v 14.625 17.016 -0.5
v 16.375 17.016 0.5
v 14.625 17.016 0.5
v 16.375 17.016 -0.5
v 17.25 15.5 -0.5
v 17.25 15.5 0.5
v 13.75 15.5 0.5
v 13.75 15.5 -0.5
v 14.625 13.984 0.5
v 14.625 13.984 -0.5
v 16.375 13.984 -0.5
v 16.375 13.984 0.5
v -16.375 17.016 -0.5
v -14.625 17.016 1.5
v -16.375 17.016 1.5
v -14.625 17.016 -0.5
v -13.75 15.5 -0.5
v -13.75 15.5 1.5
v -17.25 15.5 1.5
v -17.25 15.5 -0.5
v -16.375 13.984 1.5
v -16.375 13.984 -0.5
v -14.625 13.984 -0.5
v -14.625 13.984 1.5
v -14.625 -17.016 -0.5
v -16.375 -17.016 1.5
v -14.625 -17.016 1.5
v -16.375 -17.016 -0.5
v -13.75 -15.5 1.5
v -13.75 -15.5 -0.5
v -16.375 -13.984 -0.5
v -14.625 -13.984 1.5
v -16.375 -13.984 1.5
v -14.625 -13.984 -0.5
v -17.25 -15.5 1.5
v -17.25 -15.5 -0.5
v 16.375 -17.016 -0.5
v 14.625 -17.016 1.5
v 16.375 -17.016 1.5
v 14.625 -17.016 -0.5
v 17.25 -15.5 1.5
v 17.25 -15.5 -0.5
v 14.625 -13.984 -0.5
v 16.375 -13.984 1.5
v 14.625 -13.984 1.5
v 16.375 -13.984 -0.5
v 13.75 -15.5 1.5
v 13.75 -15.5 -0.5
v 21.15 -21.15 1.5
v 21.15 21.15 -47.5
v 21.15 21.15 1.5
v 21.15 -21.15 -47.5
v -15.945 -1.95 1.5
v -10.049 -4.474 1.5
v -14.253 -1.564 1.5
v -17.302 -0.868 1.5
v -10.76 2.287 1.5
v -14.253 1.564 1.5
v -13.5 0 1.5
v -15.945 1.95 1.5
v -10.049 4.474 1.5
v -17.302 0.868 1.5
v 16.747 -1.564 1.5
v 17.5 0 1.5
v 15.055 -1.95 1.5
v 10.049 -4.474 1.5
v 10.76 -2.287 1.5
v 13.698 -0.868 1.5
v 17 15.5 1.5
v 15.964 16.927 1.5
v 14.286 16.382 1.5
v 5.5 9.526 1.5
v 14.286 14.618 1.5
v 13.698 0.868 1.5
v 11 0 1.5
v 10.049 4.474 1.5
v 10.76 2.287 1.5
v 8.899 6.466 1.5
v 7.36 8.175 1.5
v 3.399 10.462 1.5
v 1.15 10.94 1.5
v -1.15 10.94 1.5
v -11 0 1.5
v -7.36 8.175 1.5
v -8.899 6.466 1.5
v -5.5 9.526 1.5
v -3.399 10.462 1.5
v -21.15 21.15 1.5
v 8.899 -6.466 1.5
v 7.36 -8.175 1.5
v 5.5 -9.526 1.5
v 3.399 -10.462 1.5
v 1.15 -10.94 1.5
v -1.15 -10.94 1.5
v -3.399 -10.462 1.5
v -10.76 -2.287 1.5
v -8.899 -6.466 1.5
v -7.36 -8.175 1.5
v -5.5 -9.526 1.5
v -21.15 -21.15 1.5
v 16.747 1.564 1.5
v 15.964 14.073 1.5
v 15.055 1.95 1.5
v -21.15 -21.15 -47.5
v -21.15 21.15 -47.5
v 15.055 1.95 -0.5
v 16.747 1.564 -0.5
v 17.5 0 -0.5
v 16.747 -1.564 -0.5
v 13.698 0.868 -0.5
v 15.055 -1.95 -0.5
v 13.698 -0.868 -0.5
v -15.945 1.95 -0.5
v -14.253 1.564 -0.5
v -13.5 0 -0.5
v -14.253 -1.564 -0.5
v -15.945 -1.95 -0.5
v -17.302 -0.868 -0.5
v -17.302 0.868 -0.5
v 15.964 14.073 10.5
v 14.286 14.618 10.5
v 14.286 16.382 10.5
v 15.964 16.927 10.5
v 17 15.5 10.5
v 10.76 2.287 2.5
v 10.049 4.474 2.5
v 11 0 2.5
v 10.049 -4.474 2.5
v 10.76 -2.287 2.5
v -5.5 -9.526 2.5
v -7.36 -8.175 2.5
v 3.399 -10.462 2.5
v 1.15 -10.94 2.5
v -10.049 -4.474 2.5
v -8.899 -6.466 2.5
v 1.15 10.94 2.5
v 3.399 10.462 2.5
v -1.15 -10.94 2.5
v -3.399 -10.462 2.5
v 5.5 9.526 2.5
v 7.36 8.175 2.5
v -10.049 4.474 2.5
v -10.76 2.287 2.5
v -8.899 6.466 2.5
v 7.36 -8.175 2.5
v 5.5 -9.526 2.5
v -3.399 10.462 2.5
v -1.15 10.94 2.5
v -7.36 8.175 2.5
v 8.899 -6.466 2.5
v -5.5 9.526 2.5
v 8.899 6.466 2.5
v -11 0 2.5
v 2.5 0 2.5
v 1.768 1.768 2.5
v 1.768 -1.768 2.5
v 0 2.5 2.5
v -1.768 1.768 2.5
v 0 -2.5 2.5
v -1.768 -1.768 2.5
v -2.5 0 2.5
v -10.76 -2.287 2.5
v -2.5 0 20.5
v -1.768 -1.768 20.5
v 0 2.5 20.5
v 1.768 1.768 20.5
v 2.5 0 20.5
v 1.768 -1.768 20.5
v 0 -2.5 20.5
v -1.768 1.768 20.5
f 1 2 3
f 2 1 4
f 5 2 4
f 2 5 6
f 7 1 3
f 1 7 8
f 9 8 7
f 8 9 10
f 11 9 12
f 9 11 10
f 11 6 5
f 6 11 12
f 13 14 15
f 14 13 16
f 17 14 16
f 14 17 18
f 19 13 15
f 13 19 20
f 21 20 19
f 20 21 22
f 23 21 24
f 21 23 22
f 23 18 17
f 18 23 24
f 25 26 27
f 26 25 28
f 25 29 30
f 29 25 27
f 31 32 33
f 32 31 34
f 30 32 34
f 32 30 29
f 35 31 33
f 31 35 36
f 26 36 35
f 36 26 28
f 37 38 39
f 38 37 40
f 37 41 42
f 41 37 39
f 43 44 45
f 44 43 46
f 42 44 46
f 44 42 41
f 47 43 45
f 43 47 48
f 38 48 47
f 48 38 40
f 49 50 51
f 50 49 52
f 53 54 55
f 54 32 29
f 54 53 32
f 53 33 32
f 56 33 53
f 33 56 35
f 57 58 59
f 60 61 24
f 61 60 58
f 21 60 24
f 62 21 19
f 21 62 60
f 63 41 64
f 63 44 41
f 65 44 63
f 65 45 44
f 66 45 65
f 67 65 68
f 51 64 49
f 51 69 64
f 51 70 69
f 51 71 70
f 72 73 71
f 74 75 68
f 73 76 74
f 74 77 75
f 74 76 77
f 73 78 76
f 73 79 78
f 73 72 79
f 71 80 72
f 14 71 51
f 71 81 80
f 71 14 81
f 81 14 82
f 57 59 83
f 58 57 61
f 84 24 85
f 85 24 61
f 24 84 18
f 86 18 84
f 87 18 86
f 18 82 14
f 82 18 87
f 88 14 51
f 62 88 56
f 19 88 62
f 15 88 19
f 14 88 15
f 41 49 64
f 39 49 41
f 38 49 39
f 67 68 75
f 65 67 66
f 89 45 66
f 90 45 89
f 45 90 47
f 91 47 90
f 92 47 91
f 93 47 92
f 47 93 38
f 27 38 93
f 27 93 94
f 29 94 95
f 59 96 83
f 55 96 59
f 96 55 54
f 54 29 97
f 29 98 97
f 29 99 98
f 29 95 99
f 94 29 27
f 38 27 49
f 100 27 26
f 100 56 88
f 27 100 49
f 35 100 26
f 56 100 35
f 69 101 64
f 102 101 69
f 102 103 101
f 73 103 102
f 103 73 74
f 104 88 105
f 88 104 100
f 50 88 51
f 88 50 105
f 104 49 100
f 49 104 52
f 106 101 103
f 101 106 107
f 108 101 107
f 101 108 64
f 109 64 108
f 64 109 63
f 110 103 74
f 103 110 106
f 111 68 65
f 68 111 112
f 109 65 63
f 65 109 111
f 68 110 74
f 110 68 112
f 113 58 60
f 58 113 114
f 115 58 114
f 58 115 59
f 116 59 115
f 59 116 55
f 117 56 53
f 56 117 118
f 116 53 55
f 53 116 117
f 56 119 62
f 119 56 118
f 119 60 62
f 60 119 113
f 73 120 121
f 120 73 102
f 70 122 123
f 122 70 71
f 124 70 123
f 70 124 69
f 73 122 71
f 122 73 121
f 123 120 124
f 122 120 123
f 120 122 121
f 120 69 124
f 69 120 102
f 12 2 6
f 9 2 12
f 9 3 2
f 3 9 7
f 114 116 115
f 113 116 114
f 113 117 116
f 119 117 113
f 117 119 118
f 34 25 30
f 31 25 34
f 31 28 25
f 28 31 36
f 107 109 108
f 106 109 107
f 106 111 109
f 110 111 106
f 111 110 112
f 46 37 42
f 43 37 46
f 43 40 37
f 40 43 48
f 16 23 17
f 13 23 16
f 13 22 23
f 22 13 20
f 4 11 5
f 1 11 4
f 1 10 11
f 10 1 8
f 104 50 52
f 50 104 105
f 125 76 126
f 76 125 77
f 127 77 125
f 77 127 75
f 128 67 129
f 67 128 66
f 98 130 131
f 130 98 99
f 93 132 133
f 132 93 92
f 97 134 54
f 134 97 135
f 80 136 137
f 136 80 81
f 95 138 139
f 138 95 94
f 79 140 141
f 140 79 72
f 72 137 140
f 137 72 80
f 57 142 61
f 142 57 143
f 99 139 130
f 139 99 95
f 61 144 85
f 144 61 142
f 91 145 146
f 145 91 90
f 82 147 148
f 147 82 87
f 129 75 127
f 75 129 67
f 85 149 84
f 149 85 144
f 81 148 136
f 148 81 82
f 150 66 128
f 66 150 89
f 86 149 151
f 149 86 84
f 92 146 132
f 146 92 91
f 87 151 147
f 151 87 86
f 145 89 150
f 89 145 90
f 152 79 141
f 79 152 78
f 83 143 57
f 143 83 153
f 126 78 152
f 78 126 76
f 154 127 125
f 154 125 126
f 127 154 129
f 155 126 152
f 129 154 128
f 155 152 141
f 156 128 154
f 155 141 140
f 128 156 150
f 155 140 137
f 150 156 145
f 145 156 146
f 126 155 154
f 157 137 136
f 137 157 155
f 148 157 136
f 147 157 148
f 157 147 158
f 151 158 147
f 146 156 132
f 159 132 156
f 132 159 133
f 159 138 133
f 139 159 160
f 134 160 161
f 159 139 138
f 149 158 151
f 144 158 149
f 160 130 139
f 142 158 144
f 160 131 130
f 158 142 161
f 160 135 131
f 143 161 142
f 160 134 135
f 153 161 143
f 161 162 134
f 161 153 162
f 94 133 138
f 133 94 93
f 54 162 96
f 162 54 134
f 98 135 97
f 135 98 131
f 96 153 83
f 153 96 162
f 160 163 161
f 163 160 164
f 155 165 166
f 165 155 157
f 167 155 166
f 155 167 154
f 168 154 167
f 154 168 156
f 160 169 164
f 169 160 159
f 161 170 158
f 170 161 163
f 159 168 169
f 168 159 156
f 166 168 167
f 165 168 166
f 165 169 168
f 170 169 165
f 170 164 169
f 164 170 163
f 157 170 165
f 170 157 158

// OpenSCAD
// Parameters
face_width_mm = 42.3; //[21.15:84.6:0.1]
front_face_thickness_mm = 3.0; //[1.5:6.0:0.1]
body_length_mm = 47.0; //[23.5:94.0:0.1]
body_width_mm = 42.3; //[21.15:84.6:0.1]
body_height_mm = 42.3; //[21.15:84.6:0.1]
shaft_diameter_mm = 5.0; //[2.5:10.0:0.1]
shaft_length_mm = 20.0; //[10.0:40.0:0.1]
front_boss_diameter_mm = 22.0; //[11.0:44.0:0.1]
front_boss_thickness_mm = 2.0; //[1.0:6.0:0.1]
mounting_hole_spacing_mm = 31.0; //[15.5:62.0:0.1]
mounting_hole_diameter_mm = 3.5; //[2.0:6.0:0.1]
corner_radius_mm = 2.0; //[0.5:6.0:0.1]
overlap_mm = 1.0; //[0.5:2.0:0.1]
mount_hole_depth_extra_mm = 2.0; //[1.0:6.0:0.1]
d_plug_length_mm = 18.0; //[9.0:36.0:0.1]
d_plug_width_mm = 12.0; //[6.0:24.0:0.1]
d_plug_rad_mm = 2.0; //[1.0:5.0:0.1]
grill_width_mm = 20.0; //[10.0:40.0:0.1]
grill_height_mm = 20.0; //[10.0:40.0:0.1]
grill_hole_diameter_mm = 3.0; //[1.5:6.0:0.1]
screw_shank_diameter_mm = 3.0; //[2.0:6.0:0.1]
screw_length_mm = 10.0; //[5.0:25.0:0.1]
washer_outer_diameter_mm = 7.0; //[4.0:14.0:0.1]
washer_thickness_mm = 1.0; //[0.5:2.5:0.1]
ttrack_hole_diameter_mm = 4.0; //[2.0:8.0:0.1]
rail_hole_diameter_mm = 4.0; //[2.0:8.0:0.1]

// Modules for detailed components
module d_plug_D() {
  color("DimGray") {
    translate([0, 0, -(front_face_thickness_mm/2 - overlap_mm)])
      linear_extrude(height=front_face_thickness_mm, center=true)
        offset(r=d_plug_rad_mm)
          square([d_plug_length_mm, d_plug_width_mm], center=true);
  }
}

module grill_hole_positions() {
  color("Silver") {
    translate([0, 0, 0])
      cylinder(r=grill_hole_diameter_mm/2, h=front_face_thickness_mm + mount_hole_depth_extra_mm, center=true);
  }
}

module screw_and_washer() {
  color("Black") {
    union() {
      translate([mounting_hole_spacing_mm/2, mounting_hole_spacing_mm/2, front_face_thickness_mm/2 + screw_length_mm/2 - overlap_mm])
        cylinder(r=screw_shank_diameter_mm/2, h=screw_length_mm, center=true);
      translate([mounting_hole_spacing_mm/2, mounting_hole_spacing_mm/2, front_face_thickness_mm/2 + washer_thickness_mm/2 - overlap_mm])
        cylinder(r=washer_outer_diameter_mm/2, h=washer_thickness_mm, center=true);
    }
  }
}

module ttrack_hole_positions() {
  color("Silver") {
    translate([mounting_hole_spacing_mm/2, 0, 0])
      cylinder(r=ttrack_hole_diameter_mm/2, h=front_face_thickness_mm + mount_hole_depth_extra_mm, center=true);
  }
}

module rail_hole_positions() {
  color("Silver") {
    translate([-mounting_hole_spacing_mm/2, 0, 0])
      cylinder(r=rail_hole_diameter_mm/2, h=front_face_thickness_mm + mount_hole_depth_extra_mm, center=true);
  }
}

// Main assembly
module assembly() {
  color("Black") {
    // Motor body
    translate([0, 0, -(front_face_thickness_mm/2 + body_length_mm/2 - overlap_mm)])
      cube([body_width_mm, body_height_mm, body_length_mm], center=true);
    
    // Front face with holes
    difference() {
      translate([0, 0, 0])
        cube([face_width_mm, face_width_mm, front_face_thickness_mm], center=true);
      union() {
        translate([mounting_hole_spacing_mm/2, mounting_hole_spacing_mm/2, 0])
          cylinder(r=mounting_hole_diameter_mm/2, h=front_face_thickness_mm + mount_hole_depth_extra_mm, center=true);
        translate([-mounting_hole_spacing_mm/2, mounting_hole_spacing_mm/2, 0])
          cylinder(r=mounting_hole_diameter_mm/2, h=front_face_thickness_mm + mount_hole_depth_extra_mm, center=true);
        translate([-mounting_hole_spacing_mm/2, -mounting_hole_spacing_mm/2, 0])
          cylinder(r=mounting_hole_diameter_mm/2, h=front_face_thickness_mm + mount_hole_depth_extra_mm, center=true);
        translate([mounting_hole_spacing_mm/2, -mounting_hole_spacing_mm/2, 0])
          cylinder(r=mounting_hole_diameter_mm/2, h=front_face_thickness_mm + mount_hole_depth_extra_mm, center=true);
      }
      grill_hole_positions();
      ttrack_hole_positions();
      rail_hole_positions();
    }
    
    // Front boss
    translate([0, 0, front_face_thickness_mm/2 + front_boss_thickness_mm/2 - overlap_mm])
      cylinder(r=front_boss_diameter_mm/2, h=front_boss_thickness_mm, center=true);
    
    // Output shaft
    translate([0, 0, front_face_thickness_mm/2 + shaft_length_mm/2 - overlap_mm])
      cylinder(r=shaft_diameter_mm/2, h=shaft_length_mm, center=true);
    
    // D Plug D
    d_plug_D();
    
    // Screw and Washer
    screw_and_washer();
  }
}

assembly();
